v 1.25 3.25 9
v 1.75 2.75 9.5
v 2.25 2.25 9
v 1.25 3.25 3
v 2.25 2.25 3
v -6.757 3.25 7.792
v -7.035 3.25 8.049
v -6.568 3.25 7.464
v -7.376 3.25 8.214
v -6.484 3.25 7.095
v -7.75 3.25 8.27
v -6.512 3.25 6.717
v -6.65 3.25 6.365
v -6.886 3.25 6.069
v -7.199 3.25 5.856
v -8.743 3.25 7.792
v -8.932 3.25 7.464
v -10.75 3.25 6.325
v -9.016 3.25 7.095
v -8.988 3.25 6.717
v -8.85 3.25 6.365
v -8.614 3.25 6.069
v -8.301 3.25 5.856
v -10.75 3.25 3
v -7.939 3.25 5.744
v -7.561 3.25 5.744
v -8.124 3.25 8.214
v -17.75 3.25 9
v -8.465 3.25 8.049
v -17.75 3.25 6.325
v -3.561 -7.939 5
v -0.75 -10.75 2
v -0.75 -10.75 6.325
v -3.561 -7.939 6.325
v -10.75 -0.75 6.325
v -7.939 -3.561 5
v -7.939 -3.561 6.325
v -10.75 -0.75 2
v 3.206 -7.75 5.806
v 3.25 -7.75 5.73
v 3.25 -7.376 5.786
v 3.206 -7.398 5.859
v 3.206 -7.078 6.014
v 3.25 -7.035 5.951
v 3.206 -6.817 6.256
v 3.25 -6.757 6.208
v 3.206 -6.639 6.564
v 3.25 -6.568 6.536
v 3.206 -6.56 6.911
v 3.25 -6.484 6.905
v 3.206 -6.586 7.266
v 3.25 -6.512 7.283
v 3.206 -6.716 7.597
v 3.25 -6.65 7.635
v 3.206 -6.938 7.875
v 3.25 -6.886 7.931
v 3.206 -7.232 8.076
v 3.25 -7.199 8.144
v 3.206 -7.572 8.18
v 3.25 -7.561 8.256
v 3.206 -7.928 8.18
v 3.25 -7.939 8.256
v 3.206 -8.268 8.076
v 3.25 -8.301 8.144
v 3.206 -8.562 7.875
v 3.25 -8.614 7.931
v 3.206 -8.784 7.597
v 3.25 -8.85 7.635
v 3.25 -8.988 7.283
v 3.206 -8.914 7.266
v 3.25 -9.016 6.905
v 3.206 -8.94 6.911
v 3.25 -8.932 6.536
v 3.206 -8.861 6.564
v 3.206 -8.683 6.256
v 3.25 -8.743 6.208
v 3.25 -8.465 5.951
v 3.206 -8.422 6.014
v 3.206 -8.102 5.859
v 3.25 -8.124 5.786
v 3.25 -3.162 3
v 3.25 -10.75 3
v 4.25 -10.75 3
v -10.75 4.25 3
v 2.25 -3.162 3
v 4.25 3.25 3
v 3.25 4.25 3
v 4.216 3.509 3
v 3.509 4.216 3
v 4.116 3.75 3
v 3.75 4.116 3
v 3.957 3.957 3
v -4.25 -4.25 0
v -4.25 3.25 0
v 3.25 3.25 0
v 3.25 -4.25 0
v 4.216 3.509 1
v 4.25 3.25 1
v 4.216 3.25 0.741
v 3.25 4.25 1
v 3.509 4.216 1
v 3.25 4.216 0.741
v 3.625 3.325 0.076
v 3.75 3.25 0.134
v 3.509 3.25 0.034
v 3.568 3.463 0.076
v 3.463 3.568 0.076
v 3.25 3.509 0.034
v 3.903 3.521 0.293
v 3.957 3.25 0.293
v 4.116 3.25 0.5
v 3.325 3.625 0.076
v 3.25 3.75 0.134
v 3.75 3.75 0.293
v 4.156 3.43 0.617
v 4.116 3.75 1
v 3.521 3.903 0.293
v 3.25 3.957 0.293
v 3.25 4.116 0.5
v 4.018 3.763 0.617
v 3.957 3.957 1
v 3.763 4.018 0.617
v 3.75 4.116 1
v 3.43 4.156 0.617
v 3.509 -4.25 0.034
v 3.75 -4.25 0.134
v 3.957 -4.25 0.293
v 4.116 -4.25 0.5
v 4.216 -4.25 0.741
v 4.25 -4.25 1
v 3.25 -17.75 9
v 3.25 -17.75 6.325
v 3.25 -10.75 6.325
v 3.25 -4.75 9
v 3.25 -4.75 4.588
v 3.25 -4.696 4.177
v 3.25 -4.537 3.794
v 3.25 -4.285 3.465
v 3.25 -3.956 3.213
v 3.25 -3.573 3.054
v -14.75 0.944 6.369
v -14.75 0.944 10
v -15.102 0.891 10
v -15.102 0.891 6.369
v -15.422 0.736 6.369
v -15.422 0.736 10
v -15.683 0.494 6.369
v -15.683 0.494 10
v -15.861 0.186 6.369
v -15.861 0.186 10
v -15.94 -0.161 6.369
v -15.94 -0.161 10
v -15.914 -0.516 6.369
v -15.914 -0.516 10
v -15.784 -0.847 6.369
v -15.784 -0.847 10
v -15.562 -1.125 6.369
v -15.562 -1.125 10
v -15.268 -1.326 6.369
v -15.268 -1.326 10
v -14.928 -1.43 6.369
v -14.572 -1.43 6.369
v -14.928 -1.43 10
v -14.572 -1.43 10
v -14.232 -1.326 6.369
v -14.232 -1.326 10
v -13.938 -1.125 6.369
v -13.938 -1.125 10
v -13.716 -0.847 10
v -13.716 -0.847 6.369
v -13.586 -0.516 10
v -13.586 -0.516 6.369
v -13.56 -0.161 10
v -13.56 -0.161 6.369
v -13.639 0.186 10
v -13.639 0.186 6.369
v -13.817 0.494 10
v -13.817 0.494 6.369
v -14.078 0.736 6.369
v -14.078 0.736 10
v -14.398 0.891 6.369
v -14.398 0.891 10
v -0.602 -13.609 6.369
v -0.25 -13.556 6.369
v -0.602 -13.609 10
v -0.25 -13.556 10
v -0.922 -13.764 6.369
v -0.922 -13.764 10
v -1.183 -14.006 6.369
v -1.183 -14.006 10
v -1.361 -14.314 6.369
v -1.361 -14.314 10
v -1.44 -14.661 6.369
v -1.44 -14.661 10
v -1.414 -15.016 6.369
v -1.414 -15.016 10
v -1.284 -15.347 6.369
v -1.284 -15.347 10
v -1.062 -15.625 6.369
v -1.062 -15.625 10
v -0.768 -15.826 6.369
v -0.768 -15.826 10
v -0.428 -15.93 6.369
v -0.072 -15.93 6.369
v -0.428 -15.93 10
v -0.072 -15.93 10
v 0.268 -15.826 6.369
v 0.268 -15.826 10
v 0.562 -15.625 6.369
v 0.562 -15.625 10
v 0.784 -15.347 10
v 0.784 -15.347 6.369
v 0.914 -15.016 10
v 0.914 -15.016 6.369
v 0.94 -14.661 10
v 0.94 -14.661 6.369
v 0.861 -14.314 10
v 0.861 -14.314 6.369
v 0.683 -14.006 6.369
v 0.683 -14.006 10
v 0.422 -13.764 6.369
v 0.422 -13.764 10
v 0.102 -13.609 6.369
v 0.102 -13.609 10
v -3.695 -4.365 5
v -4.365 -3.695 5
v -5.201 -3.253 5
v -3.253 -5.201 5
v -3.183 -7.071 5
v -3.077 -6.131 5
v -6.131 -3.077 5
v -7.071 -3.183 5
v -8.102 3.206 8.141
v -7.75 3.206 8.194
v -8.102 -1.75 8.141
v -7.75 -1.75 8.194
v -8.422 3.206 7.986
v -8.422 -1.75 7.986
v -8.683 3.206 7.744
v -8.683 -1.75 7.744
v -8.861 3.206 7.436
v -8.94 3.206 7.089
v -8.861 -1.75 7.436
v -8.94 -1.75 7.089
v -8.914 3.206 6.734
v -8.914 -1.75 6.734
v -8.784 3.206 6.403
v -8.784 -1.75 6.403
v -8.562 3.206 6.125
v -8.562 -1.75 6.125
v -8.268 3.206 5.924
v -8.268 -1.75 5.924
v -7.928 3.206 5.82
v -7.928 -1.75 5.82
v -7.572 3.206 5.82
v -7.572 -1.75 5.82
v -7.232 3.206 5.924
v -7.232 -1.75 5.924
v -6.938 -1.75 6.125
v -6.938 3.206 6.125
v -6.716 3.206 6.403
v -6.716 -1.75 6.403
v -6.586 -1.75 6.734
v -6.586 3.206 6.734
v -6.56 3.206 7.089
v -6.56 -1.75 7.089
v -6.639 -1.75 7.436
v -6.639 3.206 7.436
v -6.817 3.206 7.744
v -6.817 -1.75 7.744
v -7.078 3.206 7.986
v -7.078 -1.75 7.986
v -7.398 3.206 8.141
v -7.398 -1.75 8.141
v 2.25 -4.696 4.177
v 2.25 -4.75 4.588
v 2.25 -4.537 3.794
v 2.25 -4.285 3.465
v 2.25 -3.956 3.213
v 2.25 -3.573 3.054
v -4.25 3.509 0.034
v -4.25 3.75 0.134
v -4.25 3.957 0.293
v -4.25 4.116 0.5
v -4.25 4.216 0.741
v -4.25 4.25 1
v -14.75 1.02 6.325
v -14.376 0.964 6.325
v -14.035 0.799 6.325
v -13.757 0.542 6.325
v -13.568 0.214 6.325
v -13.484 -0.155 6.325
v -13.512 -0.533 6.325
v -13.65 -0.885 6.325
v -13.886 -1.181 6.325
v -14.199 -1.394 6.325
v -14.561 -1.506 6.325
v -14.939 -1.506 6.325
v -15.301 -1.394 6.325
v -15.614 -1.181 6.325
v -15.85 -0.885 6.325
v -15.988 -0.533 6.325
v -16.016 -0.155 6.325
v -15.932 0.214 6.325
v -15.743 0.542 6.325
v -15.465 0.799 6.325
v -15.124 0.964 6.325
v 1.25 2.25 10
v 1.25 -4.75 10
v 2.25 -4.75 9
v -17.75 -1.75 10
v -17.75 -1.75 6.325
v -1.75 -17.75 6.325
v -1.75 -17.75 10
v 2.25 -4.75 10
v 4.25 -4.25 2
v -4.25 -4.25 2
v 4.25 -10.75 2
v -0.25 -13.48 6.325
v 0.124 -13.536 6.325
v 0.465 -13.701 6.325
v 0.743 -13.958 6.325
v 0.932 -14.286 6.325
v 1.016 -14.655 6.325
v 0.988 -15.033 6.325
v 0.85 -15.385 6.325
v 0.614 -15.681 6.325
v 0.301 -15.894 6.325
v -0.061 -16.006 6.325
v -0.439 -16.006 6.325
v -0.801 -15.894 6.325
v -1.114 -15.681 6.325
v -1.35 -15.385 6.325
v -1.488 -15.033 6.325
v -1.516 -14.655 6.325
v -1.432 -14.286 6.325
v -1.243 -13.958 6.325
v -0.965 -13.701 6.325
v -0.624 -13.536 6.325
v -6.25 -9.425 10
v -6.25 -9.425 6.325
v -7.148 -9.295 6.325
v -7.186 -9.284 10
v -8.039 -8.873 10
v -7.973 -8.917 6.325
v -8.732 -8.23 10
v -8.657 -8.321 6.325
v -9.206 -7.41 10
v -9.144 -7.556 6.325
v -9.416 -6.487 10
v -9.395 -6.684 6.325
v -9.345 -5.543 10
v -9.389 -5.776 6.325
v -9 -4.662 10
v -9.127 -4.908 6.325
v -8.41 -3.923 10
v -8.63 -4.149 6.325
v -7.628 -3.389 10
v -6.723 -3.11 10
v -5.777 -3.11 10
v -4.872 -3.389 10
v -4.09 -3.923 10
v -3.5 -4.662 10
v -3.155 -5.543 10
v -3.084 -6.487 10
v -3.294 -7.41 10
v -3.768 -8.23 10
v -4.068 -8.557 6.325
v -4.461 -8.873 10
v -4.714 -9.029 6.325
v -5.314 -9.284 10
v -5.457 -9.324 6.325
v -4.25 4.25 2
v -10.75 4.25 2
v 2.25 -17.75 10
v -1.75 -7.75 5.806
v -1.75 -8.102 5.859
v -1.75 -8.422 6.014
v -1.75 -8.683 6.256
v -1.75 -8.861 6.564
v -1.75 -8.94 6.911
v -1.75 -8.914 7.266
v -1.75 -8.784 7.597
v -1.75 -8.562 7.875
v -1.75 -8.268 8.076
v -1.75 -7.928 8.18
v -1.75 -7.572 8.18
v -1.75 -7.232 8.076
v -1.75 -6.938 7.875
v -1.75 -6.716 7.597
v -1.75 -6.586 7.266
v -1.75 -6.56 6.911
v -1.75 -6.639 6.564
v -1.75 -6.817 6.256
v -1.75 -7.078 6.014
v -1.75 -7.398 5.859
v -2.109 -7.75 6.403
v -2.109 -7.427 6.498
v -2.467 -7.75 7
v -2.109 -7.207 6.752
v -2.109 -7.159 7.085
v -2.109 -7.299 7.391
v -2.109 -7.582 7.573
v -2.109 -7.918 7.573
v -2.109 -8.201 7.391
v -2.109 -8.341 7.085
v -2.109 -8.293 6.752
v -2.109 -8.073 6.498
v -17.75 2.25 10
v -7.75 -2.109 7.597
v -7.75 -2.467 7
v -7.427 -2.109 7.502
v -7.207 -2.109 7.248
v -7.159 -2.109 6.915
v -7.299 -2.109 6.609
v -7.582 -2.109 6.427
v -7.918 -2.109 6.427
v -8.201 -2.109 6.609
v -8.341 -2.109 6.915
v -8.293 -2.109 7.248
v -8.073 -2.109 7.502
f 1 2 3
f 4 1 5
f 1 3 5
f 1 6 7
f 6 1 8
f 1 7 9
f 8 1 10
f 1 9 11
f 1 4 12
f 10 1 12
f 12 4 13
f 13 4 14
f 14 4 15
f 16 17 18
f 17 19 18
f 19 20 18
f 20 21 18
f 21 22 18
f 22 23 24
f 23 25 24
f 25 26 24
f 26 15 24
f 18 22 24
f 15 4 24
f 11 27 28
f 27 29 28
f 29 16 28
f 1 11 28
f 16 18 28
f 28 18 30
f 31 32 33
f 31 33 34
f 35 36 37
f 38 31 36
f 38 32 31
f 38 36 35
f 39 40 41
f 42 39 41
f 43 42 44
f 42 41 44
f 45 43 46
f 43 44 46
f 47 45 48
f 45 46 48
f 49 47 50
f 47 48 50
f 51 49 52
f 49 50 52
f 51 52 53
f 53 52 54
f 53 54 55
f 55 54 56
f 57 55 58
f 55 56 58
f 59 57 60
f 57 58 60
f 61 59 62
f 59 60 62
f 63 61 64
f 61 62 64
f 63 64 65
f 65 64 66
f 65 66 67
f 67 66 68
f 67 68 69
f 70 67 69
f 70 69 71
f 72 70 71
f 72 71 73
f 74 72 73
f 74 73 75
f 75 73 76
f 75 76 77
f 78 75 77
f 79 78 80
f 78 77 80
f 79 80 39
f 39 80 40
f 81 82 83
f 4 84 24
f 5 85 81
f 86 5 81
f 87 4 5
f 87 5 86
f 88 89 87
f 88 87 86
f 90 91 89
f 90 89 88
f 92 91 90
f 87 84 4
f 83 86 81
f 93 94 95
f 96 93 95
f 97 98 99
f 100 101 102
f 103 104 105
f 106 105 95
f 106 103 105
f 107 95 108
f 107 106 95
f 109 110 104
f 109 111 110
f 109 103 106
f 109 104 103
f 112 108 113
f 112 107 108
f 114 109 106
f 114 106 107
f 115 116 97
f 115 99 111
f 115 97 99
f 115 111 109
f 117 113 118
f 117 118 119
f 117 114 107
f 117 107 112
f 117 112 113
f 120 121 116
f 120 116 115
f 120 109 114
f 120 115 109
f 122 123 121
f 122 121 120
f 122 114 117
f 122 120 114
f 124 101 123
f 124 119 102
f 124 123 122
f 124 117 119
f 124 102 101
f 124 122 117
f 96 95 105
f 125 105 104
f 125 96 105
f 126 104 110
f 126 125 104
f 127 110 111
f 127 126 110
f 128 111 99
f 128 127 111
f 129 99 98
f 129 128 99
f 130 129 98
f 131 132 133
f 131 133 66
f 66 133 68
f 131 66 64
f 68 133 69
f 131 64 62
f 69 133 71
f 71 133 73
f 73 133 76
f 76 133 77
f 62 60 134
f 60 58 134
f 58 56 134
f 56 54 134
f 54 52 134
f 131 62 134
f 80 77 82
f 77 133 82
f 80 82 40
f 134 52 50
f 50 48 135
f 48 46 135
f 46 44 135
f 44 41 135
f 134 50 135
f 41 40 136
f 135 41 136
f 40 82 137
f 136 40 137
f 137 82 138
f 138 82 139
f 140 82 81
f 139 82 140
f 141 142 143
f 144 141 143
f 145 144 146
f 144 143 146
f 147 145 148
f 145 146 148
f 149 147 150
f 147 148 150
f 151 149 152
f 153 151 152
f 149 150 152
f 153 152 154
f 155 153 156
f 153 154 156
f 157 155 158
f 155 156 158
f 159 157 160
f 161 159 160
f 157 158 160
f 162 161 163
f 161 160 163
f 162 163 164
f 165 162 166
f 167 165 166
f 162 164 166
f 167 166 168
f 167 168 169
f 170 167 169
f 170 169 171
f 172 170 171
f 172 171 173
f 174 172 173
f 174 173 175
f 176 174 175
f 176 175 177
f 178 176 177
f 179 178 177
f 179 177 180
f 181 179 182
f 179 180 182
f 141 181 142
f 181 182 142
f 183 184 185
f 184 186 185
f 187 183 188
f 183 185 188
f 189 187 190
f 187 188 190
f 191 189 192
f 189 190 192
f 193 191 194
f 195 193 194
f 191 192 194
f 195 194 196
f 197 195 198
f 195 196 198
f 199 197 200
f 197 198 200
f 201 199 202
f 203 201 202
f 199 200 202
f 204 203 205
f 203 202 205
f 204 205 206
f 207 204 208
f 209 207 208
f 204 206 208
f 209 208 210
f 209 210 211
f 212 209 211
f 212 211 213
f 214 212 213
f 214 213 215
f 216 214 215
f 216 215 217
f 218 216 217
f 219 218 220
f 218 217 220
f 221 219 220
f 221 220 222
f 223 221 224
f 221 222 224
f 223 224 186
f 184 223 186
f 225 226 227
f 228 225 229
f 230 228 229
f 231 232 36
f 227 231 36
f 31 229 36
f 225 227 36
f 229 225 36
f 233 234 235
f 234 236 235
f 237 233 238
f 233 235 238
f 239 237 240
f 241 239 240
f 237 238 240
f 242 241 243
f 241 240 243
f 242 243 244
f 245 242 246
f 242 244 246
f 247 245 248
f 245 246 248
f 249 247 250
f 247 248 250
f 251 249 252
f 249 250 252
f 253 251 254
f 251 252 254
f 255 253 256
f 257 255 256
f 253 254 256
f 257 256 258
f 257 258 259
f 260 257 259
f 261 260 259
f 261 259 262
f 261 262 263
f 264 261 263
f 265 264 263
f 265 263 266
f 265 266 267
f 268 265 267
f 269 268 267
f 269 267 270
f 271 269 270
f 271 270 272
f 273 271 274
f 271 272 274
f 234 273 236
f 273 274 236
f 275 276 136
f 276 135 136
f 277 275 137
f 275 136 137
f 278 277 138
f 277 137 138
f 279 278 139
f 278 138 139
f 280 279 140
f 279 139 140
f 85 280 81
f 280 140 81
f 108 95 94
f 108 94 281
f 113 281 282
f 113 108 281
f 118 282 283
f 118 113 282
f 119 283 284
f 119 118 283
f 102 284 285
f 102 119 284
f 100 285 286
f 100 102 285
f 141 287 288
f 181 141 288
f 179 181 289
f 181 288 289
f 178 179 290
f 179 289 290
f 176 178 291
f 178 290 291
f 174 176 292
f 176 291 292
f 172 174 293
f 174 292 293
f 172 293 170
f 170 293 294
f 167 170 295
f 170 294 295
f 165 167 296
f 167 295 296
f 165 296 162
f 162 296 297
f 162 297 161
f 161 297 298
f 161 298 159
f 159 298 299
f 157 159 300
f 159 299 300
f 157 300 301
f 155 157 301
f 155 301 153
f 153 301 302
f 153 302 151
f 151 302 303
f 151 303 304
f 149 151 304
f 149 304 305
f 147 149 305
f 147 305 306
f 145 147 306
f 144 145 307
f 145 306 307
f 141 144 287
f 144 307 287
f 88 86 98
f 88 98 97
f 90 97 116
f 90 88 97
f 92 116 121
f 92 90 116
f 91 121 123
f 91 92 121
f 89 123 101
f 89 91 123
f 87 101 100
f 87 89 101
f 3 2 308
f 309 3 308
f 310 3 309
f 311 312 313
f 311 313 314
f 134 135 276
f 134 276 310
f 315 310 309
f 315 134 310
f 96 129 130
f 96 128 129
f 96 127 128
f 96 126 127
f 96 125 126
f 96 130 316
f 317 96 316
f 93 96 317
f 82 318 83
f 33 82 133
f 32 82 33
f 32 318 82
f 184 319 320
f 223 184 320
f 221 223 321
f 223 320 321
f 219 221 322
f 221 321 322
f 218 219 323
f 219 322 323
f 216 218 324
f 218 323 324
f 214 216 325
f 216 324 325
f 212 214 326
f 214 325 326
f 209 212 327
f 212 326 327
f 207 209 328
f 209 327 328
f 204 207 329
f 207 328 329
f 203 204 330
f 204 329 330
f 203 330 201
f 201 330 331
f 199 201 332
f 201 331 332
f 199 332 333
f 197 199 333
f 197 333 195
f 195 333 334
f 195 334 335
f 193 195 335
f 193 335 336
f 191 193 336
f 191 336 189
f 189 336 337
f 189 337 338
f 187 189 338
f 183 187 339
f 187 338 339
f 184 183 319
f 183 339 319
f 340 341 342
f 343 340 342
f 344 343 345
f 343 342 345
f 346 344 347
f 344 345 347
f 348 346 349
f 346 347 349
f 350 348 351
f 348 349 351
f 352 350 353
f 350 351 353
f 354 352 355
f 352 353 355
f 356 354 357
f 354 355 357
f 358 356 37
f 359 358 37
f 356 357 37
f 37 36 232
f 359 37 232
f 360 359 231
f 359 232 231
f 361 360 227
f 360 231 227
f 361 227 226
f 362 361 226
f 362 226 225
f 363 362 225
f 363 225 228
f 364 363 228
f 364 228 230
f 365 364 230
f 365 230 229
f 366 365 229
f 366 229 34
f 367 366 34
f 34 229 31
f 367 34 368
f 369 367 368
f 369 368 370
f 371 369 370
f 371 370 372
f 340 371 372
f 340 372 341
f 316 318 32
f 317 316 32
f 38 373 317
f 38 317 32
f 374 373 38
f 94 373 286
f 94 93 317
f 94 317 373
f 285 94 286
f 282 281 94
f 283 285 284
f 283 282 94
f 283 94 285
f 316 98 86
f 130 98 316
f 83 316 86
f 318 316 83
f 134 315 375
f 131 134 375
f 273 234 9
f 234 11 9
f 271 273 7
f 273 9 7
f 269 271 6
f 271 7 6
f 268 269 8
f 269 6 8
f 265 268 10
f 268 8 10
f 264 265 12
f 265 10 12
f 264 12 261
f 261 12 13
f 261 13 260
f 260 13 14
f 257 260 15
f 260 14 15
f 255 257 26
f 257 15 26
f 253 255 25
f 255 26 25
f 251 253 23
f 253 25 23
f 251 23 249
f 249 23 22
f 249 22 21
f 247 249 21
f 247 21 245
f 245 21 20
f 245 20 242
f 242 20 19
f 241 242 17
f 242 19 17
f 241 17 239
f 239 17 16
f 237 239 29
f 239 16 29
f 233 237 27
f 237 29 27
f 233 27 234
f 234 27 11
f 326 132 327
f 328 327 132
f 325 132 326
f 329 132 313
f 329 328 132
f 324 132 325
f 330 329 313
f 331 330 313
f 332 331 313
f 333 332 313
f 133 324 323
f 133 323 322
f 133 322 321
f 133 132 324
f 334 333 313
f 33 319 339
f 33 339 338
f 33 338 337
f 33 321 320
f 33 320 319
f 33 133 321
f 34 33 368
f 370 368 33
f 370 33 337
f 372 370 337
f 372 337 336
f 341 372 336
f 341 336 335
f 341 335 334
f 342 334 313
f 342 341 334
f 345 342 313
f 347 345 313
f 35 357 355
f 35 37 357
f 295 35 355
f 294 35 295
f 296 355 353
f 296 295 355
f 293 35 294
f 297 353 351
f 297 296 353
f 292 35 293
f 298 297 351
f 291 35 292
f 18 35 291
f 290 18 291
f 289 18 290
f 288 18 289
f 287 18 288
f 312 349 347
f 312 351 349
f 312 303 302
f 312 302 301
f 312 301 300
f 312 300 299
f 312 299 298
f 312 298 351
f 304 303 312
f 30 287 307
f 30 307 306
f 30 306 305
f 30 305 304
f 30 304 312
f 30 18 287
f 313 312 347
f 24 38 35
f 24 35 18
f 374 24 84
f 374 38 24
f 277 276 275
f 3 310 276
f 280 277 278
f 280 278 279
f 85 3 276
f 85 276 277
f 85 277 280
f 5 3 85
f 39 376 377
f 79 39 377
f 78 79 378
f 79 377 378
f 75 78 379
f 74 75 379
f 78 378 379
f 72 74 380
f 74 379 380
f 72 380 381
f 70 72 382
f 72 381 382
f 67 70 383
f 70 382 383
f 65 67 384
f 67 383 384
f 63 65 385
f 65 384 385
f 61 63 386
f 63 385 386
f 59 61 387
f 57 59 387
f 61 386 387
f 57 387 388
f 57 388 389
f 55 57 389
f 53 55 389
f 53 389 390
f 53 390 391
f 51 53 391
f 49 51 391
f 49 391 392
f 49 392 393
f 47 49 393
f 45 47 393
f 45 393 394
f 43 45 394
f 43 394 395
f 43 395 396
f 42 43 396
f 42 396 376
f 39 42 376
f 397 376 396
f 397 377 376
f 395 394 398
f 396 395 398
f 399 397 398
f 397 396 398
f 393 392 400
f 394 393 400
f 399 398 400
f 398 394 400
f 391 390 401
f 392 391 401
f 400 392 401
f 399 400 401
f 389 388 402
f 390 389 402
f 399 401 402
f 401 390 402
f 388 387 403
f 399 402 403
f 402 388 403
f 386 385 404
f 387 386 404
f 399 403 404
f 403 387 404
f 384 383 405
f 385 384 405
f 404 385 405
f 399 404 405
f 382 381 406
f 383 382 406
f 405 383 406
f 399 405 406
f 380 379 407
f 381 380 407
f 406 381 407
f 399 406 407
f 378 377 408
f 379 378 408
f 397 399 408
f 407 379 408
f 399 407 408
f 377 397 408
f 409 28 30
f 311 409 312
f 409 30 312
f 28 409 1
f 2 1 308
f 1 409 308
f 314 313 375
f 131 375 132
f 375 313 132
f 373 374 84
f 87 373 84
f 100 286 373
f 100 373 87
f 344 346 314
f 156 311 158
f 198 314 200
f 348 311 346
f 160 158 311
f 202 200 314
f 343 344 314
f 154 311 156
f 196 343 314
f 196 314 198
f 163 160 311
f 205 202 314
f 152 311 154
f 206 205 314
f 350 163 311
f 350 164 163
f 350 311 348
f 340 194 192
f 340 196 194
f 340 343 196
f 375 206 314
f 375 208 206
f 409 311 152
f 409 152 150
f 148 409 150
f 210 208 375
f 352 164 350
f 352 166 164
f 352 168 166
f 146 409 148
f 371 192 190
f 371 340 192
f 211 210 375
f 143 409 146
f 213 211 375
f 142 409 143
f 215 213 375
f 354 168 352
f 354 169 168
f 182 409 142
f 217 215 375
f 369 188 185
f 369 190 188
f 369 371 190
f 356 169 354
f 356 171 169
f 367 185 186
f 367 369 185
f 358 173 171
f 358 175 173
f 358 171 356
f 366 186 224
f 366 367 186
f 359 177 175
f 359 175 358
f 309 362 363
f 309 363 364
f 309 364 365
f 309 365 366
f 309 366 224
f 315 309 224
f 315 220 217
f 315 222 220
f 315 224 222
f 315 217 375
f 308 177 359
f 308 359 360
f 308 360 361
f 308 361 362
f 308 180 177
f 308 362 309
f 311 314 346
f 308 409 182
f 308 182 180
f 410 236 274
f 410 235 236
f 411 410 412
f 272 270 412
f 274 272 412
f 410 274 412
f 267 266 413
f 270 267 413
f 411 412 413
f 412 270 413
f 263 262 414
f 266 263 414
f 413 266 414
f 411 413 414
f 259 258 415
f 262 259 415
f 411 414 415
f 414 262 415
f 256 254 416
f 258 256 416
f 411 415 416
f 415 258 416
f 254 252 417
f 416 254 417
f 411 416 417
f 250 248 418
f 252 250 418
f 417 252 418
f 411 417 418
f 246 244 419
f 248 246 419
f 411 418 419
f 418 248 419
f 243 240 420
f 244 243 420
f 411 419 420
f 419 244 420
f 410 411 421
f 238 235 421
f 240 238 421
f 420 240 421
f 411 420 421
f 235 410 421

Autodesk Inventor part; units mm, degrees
ref_plane "YZ Plane" through (0, 0, 0) normal (1, 0, 0) x (0, 1, 0)
ref_plane "XZ Plane" through (0, 0, 0) normal (0, 1, 0) x (-1, 0, 0)
ref_plane "XY Plane" through (0, 0, 0) normal (0, 0, 1) x (1, 0, 0)
sketch "Sketch1" plane through (0, 0, 0) normal (0, 0, 1) x (1, 0, 0)
  line L0 (-4.25, 4.25) -> (4.25, 4.25)
  line L1 (4.25, 4.25) -> (4.25, -4.25)
  line L2 (4.25, -4.25) -> (-4.25, -4.25)
  line L3 (-4.25, -4.25) -> (-4.25, 4.25)
  point P0 (0, 0)
  dimension "d0" = 8.5
  dimension "d1" = 8.5
  dimension "d2" = 4.25
  dimension "d3" = 4.25
extrude "Extrusion1" add sketch "Sketch1" along normal blind 3
fillet "Fillet2" radius 1 3 edges at (4.25, 4.25, 1.5) (4.25, 0, 0) (0, 4.25, 0)
sketch "Sketch10" plane through (0, 0, 3) normal (0, 0, 1) x (1, 0, 0)
  line L0 (4.25, 3.25) -> (4.25, -4.25) projected
  line L1 (-4.25, 4.25) -> (3.25, 4.25) projected
  line L2 (3.25, 3.25) -> (-17.75, 3.25)
  line L3 (-17.75, 3.25) -> (-17.75, -17.75)
  line L4 (-17.75, -17.75) -> (3.25, -17.75)
  line L5 (3.25, -17.75) -> (3.25, 3.25)
  point P0 (0, 0)
  dimension "d113" = 1
  dimension "d114" = 1
  dimension "d115" = 21
  dimension "d116" = 21
extrude "Extrusion8" add sketch "Sketch10" along normal blind 7
hole "Hole9" at (3.25, -7.75, 7) direction (-1, 0, 0) diameter 2.3876 depth 5 tip angle 118 countersink diameter 2.54 countersink angle 120
hole "Hole10" at (-7.75, 3.25, 7) direction (0, -1, 0) diameter 2.3876 depth 5 tip angle 118 countersink diameter 2.54 countersink angle 120
hole "Hole11" at (-6.25, -6.25, 10) direction (0, 0, -1) diameter 6.35 depth 5
sketch "Sketch11" plane through (0, 0, 3) normal (0, 0, -1) x (-1, 0, 0)
  line L0 (17.75, -17.75) -> (-3.25, -17.75) projected
  line L1 (17.75, 3.25) -> (17.75, -17.75) projected
  line L2 (4.25, 3.25) -> (17.75, 3.25) projected
  line L3 (10.75, 3.25) -> (17.75, 3.25)
  line L4 (17.75, 3.25) -> (17.75, -17.75)
  line L5 (17.75, -17.75) -> (-3.25, -17.75)
  line L6 (-3.25, -17.75) -> (-3.25, -10.75)
  line L7 (-3.25, -10.75) -> (0.75, -10.75)
  line L8 (0.75, -10.75) -> (10.75, -0.75)
  line L9 (10.75, -0.75) -> (10.75, 3.25)
  point P0 (0, 0)
  dimension "d146" = 14
  dimension "d158" = 4
extrude "Extrusion9" cut sketch "Sketch11" against normal blind 3.325
hole "Hole12" at (-0.25, -14.75, 6.325) direction (0, 0, 1) diameter 2.3876 end through all countersink diameter 2.54 countersink angle 120
hole "Hole13" at (-14.75, -0.25, 6.325) direction (0, 0, 1) diameter 2.3876 end through all countersink diameter 2.54 countersink angle 120
chamfer "Chamfer3" distance 16 angle 45 1 edges at (-17.75, -17.75, 8.1625)
hole "Hole14" [suppressed]
sketch "Sketch14" plane through (3.25, -4.25, 3) normal (1, 0, 0) x (0, 0, -1)
  line L0 (0, 7.5) -> (0, 0) projected
  line L1 (0, 7.5) -> (-7, 7.5) projected
  line L2 (-7, 7.5) -> (-7, -13.5) projected
  line L3 (-7, 7.5) -> (0, 7.5)
  line L4 (0, 7.5) -> (0, 1.0875)
  line L5 (-1.5875, -0.5) -> (-7, -0.5)
  line L6 (-7, -0.5) -> (-7, 7.5)
  arc A0 (-1.5875, -0.5) -> (0, 1.0875) centre (-1.5875, 1.0875) ccw
  point P0 (3, 4.25)
  dimension "d180" = 8
  dimension "d181" = 1.5875
extrude "Extrusion10" cut sketch "Sketch14" against normal blind 1
chamfer "Chamfer4" distance 1 angle 45 3 edges at (-7.75, 3.25, 10) (2.25, -0.75, 10) (3.25, -11.25, 10)
chamfer "Chamfer5" distance 1 angle 45 1 edges at (2.25, 3.25, 6.0003)
sketch "Sketch15" plane through (0, 0, 3) normal (0, 0, -1) x (-1, 0, 0)
  line L0 (-3.25, -10.75) -> (0.75, -10.75) projected
  line L1 (10.75, -0.75) -> (10.75, 3.25) projected
  line L2 (4.25, 3.25) -> (10.75, 3.25) projected
  line L3 (4.25, -4.25) -> (4.25, 3.25) projected
  line L4 (-3.25, -4.25) -> (4.25, -4.25) projected
  line L5 (-3.25, -10.75) -> (-3.25, -4.25) projected
  line L6 (4.25, 4.25) -> (10.75, 4.25)
  line L7 (10.75, 4.25) -> (10.75, -0.75)
  line L8 (10.75, -0.75) -> (0.75, -10.75)
  line L9 (0.75, -10.75) -> (-4.25, -10.75)
  line L10 (-4.25, -10.75) -> (-4.25, -4.25)
  line L11 (-4.25, -4.25) -> (4.25, -4.25)
  line L12 (4.25, -4.25) -> (4.25, 4.25)
  point P0 (0, 0)
  dimension "d190" = 1
  dimension "d191" = 1
extrude "Extrusion11" add sketch "Sketch15" along normal blind 1
properties part number "nub_plusZ_3" material "Aluminum-6061"
